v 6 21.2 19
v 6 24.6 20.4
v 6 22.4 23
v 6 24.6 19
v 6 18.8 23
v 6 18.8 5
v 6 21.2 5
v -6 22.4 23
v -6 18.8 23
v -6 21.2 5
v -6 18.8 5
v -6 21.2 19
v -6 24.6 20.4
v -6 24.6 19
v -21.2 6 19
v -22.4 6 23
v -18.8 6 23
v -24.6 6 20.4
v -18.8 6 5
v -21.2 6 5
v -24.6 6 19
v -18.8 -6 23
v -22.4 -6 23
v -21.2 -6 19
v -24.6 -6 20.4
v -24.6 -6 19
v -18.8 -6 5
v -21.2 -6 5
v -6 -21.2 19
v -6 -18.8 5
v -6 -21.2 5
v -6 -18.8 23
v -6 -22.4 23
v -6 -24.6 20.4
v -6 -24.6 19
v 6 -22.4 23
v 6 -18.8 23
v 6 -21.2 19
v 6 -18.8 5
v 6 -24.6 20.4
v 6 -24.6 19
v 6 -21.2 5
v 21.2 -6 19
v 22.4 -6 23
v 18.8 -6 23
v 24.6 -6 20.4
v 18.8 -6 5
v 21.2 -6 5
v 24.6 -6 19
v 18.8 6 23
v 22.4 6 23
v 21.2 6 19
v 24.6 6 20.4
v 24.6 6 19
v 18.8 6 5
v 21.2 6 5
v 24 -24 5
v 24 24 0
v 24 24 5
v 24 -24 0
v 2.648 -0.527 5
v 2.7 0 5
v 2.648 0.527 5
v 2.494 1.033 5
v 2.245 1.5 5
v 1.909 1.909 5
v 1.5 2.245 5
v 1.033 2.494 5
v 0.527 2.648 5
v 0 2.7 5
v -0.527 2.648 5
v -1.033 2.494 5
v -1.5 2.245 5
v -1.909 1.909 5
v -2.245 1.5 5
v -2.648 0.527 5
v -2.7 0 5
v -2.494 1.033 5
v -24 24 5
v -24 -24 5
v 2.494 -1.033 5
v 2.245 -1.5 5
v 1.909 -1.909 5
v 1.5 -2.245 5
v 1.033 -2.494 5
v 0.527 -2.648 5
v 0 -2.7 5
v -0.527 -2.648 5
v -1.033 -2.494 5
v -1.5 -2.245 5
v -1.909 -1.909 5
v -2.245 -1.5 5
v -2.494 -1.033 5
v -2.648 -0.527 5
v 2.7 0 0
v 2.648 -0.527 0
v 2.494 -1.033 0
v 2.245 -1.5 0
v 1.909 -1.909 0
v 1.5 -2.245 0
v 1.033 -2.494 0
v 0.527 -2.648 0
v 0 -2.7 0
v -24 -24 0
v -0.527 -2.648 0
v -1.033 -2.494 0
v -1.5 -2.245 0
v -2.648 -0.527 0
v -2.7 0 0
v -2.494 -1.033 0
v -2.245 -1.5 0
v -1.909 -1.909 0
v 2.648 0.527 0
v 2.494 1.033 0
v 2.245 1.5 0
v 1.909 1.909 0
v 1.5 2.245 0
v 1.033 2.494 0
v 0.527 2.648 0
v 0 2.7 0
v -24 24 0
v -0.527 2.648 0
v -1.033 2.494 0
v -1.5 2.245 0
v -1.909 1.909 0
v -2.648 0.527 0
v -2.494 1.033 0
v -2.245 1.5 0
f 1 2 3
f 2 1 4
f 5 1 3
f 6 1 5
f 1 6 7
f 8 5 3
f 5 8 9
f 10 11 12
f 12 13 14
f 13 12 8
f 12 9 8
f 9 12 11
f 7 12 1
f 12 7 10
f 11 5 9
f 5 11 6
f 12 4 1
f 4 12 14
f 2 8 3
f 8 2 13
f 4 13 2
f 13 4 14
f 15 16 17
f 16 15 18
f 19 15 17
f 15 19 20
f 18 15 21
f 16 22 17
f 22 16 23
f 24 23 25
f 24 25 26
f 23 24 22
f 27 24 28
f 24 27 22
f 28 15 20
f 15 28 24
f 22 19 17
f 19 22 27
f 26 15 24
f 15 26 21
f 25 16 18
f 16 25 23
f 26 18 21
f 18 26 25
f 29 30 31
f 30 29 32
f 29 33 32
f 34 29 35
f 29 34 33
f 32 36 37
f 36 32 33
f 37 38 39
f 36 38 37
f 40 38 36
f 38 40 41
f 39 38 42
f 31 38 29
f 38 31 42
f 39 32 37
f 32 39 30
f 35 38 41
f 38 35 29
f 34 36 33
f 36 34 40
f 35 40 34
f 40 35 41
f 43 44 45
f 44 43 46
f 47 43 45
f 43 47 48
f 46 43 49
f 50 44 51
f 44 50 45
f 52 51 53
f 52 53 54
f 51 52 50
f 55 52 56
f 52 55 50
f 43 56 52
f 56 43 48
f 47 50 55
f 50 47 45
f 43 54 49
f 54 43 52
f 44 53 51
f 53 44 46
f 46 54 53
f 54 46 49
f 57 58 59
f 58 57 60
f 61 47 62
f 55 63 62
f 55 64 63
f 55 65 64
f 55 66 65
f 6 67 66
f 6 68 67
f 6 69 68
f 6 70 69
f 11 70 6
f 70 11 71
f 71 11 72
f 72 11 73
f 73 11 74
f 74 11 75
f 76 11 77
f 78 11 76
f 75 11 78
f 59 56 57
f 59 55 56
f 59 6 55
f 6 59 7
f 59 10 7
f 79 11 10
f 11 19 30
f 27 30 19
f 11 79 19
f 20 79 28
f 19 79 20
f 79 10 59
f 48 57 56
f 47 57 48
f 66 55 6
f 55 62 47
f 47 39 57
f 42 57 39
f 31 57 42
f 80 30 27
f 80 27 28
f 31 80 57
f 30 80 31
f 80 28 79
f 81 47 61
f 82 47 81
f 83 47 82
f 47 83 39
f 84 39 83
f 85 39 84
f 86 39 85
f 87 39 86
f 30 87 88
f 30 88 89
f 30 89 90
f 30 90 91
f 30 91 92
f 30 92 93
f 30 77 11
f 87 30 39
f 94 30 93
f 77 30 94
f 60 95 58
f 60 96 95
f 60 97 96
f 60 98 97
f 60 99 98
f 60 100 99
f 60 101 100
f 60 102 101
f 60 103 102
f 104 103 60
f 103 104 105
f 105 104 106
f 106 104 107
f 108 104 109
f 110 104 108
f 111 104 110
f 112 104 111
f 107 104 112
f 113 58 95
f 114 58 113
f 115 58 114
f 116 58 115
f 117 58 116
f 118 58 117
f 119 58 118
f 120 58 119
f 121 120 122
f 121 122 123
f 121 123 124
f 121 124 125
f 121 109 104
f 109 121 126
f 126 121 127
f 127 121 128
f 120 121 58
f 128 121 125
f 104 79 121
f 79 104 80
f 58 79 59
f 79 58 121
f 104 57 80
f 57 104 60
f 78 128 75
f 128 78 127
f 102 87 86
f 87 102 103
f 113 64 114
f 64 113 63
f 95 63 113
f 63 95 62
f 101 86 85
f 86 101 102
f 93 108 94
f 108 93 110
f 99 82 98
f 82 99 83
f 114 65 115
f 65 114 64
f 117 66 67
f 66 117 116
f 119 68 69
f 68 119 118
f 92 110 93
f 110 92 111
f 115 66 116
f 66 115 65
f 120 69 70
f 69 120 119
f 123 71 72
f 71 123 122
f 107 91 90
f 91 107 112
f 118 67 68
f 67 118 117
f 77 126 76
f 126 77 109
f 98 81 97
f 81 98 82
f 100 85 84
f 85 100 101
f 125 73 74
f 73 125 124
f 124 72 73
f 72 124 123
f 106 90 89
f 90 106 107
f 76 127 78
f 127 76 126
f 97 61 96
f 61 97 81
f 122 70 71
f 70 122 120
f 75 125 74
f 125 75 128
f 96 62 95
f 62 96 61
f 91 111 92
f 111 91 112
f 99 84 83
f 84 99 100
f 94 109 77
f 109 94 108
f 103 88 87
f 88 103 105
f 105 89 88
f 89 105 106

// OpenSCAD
$fn = 32;

// ----------------------------------------------------------------------
// Snap-fit latch: 4 arms, 18 mm tall, 3.6 mm undercut hooks
// ----------------------------------------------------------------------

// --- parameters (mm) ---
base_d = 48;              // base plate depth
base_h = 5;               // base plate thickness
span = 40;                // distance between opposite arms
arm_t = 2.4;              // arm thickness
arm_d = 12;               // arm width
height = 18;              // free arm length
head_len = 3.6;           // hook reach
head_h = 4;               // hook height
lead = 1.4;               // lead-in ramp thickness
bore_d = 5.4;             // base fixing bore
top_z = 23;               // height of the arm tips above the base

arms = 4;

difference() {
  union() {
    /* base plate, centred on the arm ring */
    translate([-24, -24, 0]) cube([base_d, base_d, base_h]);
    for (a = [0 : 360 / arms : 359]) rotate([0, 0, a]) {
    /* arm, sunk 0.5 mm into the base */
    translate([-arm_d / 2, span / 2 - arm_t / 2, base_h - 0.5]) cube([arm_d, arm_t, height + 0.5]);
    /* hook: a convex hull of a tall inner block and a thin outer lip
       gives a flat undercut below and a lead-in ramp on top */
    hull() {
      translate([-arm_d / 2, span / 2 + arm_t / 2 - 0.6, top_z - head_h]) cube([arm_d, lead + 0.4, head_h]);
      translate([-arm_d / 2, span / 2 + arm_t / 2 - 0.2, top_z - head_h]) cube([arm_d, head_len, lead]);
    }
    }
  }
  translate([0, 0, -2.5]) cylinder(h = base_h + 5, d = bore_d);
}
